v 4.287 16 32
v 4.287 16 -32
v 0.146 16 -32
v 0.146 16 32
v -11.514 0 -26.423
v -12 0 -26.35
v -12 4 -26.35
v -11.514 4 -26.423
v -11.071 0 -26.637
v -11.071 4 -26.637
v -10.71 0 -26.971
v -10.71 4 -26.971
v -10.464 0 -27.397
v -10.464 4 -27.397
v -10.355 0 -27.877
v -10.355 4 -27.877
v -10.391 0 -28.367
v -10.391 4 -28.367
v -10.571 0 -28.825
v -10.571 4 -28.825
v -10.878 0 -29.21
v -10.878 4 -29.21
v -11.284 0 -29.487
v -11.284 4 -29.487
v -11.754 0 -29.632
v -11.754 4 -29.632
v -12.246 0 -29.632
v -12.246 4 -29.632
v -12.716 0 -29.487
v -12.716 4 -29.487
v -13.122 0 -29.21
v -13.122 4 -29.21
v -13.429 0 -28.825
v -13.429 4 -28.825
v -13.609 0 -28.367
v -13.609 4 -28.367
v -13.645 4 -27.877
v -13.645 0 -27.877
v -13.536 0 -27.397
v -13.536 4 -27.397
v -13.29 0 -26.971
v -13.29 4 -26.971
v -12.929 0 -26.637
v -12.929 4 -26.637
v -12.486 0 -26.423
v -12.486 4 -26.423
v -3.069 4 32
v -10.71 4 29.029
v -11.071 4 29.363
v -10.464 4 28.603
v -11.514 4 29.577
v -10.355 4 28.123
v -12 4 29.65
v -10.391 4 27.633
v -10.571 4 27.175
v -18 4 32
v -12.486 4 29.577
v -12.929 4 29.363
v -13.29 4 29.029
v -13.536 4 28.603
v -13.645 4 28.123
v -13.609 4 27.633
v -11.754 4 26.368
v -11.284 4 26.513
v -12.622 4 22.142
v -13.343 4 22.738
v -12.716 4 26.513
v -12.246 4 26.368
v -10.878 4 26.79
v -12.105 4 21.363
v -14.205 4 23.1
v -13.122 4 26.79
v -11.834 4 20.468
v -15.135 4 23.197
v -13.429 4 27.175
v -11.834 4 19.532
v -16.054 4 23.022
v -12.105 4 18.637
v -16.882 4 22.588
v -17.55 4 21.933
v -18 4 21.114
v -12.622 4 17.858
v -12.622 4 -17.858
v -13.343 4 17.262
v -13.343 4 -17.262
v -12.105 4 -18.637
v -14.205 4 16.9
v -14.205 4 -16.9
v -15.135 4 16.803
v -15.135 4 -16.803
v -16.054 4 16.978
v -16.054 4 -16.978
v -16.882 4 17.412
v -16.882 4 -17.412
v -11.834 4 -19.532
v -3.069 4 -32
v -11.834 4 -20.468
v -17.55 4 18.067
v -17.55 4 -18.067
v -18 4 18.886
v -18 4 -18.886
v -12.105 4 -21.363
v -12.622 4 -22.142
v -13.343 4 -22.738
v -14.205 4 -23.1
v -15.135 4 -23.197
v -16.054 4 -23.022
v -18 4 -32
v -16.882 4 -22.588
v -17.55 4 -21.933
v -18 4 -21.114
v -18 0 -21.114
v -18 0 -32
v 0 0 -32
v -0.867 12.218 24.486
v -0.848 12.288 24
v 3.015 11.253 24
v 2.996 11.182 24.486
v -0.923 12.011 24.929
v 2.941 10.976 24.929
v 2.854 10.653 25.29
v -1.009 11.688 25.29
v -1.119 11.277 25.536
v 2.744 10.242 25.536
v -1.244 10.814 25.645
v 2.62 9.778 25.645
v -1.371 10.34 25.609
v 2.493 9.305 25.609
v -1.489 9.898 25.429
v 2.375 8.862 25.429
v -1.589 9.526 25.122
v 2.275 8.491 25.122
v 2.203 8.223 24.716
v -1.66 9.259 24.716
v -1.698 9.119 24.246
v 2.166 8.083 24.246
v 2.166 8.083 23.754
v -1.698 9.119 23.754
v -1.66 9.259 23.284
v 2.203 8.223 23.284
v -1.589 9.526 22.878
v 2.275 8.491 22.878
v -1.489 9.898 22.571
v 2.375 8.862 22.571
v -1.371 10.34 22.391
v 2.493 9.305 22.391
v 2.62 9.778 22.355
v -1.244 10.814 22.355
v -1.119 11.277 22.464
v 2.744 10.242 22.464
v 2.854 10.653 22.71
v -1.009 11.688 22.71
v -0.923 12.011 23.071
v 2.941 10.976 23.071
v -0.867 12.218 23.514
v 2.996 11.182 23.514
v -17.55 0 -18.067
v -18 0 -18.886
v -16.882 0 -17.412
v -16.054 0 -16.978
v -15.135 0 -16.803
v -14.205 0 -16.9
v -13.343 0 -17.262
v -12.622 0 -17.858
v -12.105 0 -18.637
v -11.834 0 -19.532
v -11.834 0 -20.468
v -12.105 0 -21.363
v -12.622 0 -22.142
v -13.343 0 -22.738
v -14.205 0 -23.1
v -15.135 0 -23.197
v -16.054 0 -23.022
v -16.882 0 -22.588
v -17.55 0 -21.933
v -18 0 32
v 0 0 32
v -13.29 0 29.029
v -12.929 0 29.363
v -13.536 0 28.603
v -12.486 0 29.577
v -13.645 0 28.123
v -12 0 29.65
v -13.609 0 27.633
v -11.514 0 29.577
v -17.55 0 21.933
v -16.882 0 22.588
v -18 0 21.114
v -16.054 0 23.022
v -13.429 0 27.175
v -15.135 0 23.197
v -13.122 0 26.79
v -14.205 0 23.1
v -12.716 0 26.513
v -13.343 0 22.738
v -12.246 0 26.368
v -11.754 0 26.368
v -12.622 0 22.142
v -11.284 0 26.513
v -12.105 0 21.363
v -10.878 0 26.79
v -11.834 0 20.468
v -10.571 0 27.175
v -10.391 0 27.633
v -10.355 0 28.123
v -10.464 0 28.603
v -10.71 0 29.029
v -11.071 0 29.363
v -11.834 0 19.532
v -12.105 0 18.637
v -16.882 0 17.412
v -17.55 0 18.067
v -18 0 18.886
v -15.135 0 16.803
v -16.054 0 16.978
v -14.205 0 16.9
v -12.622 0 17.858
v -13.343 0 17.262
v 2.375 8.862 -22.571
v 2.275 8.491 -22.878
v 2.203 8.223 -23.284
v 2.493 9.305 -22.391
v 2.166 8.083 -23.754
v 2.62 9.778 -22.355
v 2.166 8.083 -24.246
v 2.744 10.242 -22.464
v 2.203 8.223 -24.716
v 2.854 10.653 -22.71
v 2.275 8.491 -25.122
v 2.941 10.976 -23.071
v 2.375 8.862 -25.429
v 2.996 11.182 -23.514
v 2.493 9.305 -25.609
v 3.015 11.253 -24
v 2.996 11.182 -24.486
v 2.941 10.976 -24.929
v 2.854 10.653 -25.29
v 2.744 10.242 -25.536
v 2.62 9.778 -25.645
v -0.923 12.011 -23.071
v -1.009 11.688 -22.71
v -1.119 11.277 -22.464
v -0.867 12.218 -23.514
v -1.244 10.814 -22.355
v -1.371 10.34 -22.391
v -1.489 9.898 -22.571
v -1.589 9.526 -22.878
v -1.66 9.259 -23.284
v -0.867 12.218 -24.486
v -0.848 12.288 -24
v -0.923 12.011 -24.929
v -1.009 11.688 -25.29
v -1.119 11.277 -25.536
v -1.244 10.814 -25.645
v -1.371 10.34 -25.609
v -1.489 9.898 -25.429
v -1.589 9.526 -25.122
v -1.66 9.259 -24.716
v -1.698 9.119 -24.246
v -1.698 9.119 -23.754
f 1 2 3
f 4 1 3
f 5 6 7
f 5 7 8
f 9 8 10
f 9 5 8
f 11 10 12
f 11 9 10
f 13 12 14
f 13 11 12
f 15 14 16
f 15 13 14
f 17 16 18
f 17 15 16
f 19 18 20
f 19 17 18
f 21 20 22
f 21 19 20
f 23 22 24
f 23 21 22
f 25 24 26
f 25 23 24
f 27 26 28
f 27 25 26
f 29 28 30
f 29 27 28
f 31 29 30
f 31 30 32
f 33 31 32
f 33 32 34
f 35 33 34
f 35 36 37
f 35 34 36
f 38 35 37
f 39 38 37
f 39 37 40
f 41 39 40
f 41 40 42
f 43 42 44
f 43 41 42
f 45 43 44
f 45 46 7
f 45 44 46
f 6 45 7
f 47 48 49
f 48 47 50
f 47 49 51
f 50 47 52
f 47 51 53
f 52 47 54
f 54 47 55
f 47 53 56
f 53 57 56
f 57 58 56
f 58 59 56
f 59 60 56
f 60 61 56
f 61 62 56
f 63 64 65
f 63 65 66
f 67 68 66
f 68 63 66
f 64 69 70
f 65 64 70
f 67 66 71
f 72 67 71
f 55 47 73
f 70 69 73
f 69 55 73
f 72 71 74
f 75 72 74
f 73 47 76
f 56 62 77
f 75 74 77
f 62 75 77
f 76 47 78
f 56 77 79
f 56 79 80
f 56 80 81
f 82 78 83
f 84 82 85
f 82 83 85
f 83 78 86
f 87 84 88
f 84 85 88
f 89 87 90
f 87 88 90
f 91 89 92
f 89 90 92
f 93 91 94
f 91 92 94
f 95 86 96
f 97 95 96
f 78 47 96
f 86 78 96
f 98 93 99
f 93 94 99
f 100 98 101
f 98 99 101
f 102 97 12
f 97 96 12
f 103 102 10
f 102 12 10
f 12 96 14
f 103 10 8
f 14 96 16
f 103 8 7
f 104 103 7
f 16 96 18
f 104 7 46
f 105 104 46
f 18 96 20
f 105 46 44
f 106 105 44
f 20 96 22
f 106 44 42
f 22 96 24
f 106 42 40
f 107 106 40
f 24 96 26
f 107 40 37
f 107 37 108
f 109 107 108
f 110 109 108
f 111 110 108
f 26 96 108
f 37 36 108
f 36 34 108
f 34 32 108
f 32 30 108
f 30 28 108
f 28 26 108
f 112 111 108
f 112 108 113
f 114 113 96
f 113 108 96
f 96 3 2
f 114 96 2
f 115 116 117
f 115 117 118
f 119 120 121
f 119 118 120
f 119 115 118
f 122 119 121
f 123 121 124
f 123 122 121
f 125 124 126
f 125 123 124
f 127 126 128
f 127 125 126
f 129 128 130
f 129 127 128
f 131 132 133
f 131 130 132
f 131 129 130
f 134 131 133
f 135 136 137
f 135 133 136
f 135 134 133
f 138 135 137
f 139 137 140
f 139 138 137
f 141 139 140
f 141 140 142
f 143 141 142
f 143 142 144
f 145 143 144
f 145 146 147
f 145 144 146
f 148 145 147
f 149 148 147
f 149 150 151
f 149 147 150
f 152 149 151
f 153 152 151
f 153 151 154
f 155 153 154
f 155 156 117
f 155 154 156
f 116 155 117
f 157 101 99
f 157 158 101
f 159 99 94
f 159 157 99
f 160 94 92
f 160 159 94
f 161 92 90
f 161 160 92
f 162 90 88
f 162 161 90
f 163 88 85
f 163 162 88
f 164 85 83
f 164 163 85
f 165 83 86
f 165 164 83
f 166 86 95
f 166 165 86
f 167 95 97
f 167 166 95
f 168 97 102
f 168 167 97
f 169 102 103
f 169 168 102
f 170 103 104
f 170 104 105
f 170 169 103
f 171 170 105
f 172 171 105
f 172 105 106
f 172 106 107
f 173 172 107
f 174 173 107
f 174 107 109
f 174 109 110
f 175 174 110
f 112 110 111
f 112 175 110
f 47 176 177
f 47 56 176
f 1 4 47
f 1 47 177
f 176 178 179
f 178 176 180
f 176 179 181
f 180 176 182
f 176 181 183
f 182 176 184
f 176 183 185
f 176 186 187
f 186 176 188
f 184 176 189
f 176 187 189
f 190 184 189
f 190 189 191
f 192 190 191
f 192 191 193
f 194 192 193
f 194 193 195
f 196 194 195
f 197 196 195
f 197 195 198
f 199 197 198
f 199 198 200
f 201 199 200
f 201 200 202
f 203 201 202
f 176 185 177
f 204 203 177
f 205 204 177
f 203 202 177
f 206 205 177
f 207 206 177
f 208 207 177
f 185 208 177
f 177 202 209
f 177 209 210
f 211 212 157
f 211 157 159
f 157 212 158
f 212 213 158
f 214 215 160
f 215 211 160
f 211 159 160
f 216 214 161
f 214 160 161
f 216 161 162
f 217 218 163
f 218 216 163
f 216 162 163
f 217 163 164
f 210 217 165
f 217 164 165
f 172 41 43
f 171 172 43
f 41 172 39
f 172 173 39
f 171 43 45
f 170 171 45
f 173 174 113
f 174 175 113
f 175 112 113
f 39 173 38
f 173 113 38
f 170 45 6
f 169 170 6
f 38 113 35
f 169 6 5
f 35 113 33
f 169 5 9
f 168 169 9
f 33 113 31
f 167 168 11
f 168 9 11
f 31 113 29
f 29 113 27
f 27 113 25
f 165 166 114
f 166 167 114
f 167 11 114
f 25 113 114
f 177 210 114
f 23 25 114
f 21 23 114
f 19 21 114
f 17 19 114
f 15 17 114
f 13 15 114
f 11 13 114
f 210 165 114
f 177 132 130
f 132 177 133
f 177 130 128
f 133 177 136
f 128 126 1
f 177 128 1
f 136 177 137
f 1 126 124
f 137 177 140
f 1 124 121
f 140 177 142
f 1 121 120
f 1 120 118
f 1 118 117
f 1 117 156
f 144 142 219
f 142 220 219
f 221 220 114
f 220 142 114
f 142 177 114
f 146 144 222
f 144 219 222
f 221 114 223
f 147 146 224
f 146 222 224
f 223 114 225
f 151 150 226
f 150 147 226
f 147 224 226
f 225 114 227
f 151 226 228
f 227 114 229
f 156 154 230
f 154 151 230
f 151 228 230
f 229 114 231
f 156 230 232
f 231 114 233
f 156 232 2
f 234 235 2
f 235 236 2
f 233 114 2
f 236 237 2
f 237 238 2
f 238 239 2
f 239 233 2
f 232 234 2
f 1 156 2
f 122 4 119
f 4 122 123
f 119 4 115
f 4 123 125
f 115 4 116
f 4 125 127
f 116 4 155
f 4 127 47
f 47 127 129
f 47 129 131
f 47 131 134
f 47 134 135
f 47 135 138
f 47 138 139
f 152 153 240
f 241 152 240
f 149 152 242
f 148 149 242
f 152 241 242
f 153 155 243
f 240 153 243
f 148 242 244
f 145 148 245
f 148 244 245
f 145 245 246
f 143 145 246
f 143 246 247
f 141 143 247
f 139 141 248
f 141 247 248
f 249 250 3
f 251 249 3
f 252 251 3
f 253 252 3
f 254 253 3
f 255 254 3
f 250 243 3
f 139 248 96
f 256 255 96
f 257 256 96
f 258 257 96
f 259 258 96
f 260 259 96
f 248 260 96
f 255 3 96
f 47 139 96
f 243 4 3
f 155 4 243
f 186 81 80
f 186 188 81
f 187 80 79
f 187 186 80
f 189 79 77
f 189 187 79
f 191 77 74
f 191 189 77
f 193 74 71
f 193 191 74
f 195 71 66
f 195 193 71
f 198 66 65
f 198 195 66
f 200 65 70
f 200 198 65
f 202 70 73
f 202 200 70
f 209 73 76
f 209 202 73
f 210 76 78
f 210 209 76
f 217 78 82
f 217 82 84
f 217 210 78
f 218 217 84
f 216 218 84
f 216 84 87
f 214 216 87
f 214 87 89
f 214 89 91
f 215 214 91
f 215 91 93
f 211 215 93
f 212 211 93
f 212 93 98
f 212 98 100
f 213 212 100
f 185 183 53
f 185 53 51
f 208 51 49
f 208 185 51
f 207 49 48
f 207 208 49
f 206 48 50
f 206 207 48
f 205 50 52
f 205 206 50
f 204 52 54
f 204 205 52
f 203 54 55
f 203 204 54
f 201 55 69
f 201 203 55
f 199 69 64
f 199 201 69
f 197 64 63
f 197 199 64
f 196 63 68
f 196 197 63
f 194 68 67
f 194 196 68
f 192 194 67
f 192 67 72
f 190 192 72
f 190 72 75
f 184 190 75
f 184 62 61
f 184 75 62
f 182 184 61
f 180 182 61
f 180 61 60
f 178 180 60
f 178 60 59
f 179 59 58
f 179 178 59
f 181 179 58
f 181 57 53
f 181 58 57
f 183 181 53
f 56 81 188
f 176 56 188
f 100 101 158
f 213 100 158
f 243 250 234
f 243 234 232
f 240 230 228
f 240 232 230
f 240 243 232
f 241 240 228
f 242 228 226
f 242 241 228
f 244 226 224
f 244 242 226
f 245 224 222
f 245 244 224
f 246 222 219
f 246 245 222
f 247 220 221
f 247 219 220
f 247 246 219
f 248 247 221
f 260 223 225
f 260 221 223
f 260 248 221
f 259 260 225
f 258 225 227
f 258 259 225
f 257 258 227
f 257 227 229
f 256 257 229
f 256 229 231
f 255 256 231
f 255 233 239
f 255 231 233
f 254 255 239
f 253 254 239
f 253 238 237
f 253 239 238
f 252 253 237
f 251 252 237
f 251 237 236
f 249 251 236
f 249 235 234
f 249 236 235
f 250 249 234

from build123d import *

# Parameters (mm, degrees)
EXTRUDE_START                 = -32
EXTRUDE_15_DEPTH              = 64
CUT_EXTRUDE_1_DEPTH           = 100
CUT_EXTRUDE_1_DEPTH_BACK      = 100
SKETCH_2_R                    = 3.2
CUT_EXTRUDE_1_2_DEPTH         = 100
CUT_EXTRUDE_1_2_DEPTH_BACK    = 100
SKETCH_3_R                    = 3.2
CUT_EXTRUDE_M3_1_DEPTH        = 100
CUT_EXTRUDE_M3_1_DEPTH_BACK   = 100
SKETCH_4_R                    = 1.65
CUT_EXTRUDE_M3_1_2_DEPTH      = 100
CUT_EXTRUDE_M3_1_2_DEPTH_BACK = 100
SKETCH_5_R                    = 1.65
CUT_EXTRUDE_M3_DEPTH          = 12
CUT_EXTRUDE_M3_DEPTH_BACK     = 12
SKETCH_6_R                    = 1.65


with BuildPart() as part:
    # 草图1 → 四毫米底座及15度斜壁 (new body)
    with BuildSketch(Plane.XY.offset(EXTRUDE_START)):
        Polygon((-18, 0), (0, 0), (4.287187079, 16), (0.146082357, 16), (-3.069307952, 4), (-18, 4), align=None)
    extrude(amount=EXTRUDE_15_DEPTH)

    # 草图2 → Cut-Extrude 1 (cut, two sides: drawn at the far end of the back side and taken through both)
    with BuildSketch(Plane(origin=(0, 0, 0), x_dir=(1, 0, 0), z_dir=(0, 1, 0)).offset(-CUT_EXTRUDE_1_DEPTH_BACK)):
        with Locations((-15, 20)):
            Circle(SKETCH_2_R)
    extrude(amount=CUT_EXTRUDE_1_DEPTH + CUT_EXTRUDE_1_DEPTH_BACK, mode=Mode.SUBTRACT)

    # 草图3 → Cut-Extrude 1 2 (cut, two sides: drawn at the far end of the back side and taken through both)
    with BuildSketch(Plane(origin=(0, 0, 0), x_dir=(1, 0, 0), z_dir=(0, 1, 0)).offset(-CUT_EXTRUDE_1_2_DEPTH_BACK)):
        with Locations((-15, -20)):
            Circle(SKETCH_3_R)
    extrude(amount=CUT_EXTRUDE_1_2_DEPTH + CUT_EXTRUDE_1_2_DEPTH_BACK, mode=Mode.SUBTRACT)

    # 草图4 → Cut-Extrude M3__-1 (cut, two sides: drawn at the far end of the back side and taken through both)
    with BuildSketch(Plane(origin=(0, 0, 0), x_dir=(1, 0, 0), z_dir=(0, 1, 0)).offset(-CUT_EXTRUDE_M3_1_DEPTH_BACK)):
        with Locations(Location((-12, 28, 0), (0, 0, 270))):
            Circle(SKETCH_4_R)
    extrude(amount=CUT_EXTRUDE_M3_1_DEPTH + CUT_EXTRUDE_M3_1_DEPTH_BACK, mode=Mode.SUBTRACT)

    # 草图5 → Cut-Extrude M3__1 2 (cut, two sides: drawn at the far end of the back side and taken through both)
    with BuildSketch(Plane(origin=(0, 0, 0), x_dir=(1, 0, 0), z_dir=(0, 1, 0)).offset(-CUT_EXTRUDE_M3_1_2_DEPTH_BACK)):
        with Locations(Location((-12, -28, 0), (0, 0, 270))):
            Circle(SKETCH_5_R)
    extrude(amount=CUT_EXTRUDE_M3_1_2_DEPTH + CUT_EXTRUDE_M3_1_2_DEPTH_BACK, mode=Mode.SUBTRACT)

    # 草图6 → 长脚斜面双M3孔 (cut, two sides: drawn at the far end of the back side and taken through both)
    with BuildSketch(Plane(origin=(0, 0, 0), x_dir=(0, 0, -1), z_dir=(0.9659258262890684, -0.2588190451025208, 0)).offset(-CUT_EXTRUDE_M3_DEPTH_BACK)):
        with Locations(Location((24, 10, 0), (0, 0, 90))):
            Circle(SKETCH_6_R)
        with Locations(Location((-24, 10, 0), (0, 0, 90))):
            Circle(SKETCH_6_R)
    extrude(amount=CUT_EXTRUDE_M3_DEPTH + CUT_EXTRUDE_M3_DEPTH_BACK, mode=Mode.SUBTRACT)


solid = part.part
